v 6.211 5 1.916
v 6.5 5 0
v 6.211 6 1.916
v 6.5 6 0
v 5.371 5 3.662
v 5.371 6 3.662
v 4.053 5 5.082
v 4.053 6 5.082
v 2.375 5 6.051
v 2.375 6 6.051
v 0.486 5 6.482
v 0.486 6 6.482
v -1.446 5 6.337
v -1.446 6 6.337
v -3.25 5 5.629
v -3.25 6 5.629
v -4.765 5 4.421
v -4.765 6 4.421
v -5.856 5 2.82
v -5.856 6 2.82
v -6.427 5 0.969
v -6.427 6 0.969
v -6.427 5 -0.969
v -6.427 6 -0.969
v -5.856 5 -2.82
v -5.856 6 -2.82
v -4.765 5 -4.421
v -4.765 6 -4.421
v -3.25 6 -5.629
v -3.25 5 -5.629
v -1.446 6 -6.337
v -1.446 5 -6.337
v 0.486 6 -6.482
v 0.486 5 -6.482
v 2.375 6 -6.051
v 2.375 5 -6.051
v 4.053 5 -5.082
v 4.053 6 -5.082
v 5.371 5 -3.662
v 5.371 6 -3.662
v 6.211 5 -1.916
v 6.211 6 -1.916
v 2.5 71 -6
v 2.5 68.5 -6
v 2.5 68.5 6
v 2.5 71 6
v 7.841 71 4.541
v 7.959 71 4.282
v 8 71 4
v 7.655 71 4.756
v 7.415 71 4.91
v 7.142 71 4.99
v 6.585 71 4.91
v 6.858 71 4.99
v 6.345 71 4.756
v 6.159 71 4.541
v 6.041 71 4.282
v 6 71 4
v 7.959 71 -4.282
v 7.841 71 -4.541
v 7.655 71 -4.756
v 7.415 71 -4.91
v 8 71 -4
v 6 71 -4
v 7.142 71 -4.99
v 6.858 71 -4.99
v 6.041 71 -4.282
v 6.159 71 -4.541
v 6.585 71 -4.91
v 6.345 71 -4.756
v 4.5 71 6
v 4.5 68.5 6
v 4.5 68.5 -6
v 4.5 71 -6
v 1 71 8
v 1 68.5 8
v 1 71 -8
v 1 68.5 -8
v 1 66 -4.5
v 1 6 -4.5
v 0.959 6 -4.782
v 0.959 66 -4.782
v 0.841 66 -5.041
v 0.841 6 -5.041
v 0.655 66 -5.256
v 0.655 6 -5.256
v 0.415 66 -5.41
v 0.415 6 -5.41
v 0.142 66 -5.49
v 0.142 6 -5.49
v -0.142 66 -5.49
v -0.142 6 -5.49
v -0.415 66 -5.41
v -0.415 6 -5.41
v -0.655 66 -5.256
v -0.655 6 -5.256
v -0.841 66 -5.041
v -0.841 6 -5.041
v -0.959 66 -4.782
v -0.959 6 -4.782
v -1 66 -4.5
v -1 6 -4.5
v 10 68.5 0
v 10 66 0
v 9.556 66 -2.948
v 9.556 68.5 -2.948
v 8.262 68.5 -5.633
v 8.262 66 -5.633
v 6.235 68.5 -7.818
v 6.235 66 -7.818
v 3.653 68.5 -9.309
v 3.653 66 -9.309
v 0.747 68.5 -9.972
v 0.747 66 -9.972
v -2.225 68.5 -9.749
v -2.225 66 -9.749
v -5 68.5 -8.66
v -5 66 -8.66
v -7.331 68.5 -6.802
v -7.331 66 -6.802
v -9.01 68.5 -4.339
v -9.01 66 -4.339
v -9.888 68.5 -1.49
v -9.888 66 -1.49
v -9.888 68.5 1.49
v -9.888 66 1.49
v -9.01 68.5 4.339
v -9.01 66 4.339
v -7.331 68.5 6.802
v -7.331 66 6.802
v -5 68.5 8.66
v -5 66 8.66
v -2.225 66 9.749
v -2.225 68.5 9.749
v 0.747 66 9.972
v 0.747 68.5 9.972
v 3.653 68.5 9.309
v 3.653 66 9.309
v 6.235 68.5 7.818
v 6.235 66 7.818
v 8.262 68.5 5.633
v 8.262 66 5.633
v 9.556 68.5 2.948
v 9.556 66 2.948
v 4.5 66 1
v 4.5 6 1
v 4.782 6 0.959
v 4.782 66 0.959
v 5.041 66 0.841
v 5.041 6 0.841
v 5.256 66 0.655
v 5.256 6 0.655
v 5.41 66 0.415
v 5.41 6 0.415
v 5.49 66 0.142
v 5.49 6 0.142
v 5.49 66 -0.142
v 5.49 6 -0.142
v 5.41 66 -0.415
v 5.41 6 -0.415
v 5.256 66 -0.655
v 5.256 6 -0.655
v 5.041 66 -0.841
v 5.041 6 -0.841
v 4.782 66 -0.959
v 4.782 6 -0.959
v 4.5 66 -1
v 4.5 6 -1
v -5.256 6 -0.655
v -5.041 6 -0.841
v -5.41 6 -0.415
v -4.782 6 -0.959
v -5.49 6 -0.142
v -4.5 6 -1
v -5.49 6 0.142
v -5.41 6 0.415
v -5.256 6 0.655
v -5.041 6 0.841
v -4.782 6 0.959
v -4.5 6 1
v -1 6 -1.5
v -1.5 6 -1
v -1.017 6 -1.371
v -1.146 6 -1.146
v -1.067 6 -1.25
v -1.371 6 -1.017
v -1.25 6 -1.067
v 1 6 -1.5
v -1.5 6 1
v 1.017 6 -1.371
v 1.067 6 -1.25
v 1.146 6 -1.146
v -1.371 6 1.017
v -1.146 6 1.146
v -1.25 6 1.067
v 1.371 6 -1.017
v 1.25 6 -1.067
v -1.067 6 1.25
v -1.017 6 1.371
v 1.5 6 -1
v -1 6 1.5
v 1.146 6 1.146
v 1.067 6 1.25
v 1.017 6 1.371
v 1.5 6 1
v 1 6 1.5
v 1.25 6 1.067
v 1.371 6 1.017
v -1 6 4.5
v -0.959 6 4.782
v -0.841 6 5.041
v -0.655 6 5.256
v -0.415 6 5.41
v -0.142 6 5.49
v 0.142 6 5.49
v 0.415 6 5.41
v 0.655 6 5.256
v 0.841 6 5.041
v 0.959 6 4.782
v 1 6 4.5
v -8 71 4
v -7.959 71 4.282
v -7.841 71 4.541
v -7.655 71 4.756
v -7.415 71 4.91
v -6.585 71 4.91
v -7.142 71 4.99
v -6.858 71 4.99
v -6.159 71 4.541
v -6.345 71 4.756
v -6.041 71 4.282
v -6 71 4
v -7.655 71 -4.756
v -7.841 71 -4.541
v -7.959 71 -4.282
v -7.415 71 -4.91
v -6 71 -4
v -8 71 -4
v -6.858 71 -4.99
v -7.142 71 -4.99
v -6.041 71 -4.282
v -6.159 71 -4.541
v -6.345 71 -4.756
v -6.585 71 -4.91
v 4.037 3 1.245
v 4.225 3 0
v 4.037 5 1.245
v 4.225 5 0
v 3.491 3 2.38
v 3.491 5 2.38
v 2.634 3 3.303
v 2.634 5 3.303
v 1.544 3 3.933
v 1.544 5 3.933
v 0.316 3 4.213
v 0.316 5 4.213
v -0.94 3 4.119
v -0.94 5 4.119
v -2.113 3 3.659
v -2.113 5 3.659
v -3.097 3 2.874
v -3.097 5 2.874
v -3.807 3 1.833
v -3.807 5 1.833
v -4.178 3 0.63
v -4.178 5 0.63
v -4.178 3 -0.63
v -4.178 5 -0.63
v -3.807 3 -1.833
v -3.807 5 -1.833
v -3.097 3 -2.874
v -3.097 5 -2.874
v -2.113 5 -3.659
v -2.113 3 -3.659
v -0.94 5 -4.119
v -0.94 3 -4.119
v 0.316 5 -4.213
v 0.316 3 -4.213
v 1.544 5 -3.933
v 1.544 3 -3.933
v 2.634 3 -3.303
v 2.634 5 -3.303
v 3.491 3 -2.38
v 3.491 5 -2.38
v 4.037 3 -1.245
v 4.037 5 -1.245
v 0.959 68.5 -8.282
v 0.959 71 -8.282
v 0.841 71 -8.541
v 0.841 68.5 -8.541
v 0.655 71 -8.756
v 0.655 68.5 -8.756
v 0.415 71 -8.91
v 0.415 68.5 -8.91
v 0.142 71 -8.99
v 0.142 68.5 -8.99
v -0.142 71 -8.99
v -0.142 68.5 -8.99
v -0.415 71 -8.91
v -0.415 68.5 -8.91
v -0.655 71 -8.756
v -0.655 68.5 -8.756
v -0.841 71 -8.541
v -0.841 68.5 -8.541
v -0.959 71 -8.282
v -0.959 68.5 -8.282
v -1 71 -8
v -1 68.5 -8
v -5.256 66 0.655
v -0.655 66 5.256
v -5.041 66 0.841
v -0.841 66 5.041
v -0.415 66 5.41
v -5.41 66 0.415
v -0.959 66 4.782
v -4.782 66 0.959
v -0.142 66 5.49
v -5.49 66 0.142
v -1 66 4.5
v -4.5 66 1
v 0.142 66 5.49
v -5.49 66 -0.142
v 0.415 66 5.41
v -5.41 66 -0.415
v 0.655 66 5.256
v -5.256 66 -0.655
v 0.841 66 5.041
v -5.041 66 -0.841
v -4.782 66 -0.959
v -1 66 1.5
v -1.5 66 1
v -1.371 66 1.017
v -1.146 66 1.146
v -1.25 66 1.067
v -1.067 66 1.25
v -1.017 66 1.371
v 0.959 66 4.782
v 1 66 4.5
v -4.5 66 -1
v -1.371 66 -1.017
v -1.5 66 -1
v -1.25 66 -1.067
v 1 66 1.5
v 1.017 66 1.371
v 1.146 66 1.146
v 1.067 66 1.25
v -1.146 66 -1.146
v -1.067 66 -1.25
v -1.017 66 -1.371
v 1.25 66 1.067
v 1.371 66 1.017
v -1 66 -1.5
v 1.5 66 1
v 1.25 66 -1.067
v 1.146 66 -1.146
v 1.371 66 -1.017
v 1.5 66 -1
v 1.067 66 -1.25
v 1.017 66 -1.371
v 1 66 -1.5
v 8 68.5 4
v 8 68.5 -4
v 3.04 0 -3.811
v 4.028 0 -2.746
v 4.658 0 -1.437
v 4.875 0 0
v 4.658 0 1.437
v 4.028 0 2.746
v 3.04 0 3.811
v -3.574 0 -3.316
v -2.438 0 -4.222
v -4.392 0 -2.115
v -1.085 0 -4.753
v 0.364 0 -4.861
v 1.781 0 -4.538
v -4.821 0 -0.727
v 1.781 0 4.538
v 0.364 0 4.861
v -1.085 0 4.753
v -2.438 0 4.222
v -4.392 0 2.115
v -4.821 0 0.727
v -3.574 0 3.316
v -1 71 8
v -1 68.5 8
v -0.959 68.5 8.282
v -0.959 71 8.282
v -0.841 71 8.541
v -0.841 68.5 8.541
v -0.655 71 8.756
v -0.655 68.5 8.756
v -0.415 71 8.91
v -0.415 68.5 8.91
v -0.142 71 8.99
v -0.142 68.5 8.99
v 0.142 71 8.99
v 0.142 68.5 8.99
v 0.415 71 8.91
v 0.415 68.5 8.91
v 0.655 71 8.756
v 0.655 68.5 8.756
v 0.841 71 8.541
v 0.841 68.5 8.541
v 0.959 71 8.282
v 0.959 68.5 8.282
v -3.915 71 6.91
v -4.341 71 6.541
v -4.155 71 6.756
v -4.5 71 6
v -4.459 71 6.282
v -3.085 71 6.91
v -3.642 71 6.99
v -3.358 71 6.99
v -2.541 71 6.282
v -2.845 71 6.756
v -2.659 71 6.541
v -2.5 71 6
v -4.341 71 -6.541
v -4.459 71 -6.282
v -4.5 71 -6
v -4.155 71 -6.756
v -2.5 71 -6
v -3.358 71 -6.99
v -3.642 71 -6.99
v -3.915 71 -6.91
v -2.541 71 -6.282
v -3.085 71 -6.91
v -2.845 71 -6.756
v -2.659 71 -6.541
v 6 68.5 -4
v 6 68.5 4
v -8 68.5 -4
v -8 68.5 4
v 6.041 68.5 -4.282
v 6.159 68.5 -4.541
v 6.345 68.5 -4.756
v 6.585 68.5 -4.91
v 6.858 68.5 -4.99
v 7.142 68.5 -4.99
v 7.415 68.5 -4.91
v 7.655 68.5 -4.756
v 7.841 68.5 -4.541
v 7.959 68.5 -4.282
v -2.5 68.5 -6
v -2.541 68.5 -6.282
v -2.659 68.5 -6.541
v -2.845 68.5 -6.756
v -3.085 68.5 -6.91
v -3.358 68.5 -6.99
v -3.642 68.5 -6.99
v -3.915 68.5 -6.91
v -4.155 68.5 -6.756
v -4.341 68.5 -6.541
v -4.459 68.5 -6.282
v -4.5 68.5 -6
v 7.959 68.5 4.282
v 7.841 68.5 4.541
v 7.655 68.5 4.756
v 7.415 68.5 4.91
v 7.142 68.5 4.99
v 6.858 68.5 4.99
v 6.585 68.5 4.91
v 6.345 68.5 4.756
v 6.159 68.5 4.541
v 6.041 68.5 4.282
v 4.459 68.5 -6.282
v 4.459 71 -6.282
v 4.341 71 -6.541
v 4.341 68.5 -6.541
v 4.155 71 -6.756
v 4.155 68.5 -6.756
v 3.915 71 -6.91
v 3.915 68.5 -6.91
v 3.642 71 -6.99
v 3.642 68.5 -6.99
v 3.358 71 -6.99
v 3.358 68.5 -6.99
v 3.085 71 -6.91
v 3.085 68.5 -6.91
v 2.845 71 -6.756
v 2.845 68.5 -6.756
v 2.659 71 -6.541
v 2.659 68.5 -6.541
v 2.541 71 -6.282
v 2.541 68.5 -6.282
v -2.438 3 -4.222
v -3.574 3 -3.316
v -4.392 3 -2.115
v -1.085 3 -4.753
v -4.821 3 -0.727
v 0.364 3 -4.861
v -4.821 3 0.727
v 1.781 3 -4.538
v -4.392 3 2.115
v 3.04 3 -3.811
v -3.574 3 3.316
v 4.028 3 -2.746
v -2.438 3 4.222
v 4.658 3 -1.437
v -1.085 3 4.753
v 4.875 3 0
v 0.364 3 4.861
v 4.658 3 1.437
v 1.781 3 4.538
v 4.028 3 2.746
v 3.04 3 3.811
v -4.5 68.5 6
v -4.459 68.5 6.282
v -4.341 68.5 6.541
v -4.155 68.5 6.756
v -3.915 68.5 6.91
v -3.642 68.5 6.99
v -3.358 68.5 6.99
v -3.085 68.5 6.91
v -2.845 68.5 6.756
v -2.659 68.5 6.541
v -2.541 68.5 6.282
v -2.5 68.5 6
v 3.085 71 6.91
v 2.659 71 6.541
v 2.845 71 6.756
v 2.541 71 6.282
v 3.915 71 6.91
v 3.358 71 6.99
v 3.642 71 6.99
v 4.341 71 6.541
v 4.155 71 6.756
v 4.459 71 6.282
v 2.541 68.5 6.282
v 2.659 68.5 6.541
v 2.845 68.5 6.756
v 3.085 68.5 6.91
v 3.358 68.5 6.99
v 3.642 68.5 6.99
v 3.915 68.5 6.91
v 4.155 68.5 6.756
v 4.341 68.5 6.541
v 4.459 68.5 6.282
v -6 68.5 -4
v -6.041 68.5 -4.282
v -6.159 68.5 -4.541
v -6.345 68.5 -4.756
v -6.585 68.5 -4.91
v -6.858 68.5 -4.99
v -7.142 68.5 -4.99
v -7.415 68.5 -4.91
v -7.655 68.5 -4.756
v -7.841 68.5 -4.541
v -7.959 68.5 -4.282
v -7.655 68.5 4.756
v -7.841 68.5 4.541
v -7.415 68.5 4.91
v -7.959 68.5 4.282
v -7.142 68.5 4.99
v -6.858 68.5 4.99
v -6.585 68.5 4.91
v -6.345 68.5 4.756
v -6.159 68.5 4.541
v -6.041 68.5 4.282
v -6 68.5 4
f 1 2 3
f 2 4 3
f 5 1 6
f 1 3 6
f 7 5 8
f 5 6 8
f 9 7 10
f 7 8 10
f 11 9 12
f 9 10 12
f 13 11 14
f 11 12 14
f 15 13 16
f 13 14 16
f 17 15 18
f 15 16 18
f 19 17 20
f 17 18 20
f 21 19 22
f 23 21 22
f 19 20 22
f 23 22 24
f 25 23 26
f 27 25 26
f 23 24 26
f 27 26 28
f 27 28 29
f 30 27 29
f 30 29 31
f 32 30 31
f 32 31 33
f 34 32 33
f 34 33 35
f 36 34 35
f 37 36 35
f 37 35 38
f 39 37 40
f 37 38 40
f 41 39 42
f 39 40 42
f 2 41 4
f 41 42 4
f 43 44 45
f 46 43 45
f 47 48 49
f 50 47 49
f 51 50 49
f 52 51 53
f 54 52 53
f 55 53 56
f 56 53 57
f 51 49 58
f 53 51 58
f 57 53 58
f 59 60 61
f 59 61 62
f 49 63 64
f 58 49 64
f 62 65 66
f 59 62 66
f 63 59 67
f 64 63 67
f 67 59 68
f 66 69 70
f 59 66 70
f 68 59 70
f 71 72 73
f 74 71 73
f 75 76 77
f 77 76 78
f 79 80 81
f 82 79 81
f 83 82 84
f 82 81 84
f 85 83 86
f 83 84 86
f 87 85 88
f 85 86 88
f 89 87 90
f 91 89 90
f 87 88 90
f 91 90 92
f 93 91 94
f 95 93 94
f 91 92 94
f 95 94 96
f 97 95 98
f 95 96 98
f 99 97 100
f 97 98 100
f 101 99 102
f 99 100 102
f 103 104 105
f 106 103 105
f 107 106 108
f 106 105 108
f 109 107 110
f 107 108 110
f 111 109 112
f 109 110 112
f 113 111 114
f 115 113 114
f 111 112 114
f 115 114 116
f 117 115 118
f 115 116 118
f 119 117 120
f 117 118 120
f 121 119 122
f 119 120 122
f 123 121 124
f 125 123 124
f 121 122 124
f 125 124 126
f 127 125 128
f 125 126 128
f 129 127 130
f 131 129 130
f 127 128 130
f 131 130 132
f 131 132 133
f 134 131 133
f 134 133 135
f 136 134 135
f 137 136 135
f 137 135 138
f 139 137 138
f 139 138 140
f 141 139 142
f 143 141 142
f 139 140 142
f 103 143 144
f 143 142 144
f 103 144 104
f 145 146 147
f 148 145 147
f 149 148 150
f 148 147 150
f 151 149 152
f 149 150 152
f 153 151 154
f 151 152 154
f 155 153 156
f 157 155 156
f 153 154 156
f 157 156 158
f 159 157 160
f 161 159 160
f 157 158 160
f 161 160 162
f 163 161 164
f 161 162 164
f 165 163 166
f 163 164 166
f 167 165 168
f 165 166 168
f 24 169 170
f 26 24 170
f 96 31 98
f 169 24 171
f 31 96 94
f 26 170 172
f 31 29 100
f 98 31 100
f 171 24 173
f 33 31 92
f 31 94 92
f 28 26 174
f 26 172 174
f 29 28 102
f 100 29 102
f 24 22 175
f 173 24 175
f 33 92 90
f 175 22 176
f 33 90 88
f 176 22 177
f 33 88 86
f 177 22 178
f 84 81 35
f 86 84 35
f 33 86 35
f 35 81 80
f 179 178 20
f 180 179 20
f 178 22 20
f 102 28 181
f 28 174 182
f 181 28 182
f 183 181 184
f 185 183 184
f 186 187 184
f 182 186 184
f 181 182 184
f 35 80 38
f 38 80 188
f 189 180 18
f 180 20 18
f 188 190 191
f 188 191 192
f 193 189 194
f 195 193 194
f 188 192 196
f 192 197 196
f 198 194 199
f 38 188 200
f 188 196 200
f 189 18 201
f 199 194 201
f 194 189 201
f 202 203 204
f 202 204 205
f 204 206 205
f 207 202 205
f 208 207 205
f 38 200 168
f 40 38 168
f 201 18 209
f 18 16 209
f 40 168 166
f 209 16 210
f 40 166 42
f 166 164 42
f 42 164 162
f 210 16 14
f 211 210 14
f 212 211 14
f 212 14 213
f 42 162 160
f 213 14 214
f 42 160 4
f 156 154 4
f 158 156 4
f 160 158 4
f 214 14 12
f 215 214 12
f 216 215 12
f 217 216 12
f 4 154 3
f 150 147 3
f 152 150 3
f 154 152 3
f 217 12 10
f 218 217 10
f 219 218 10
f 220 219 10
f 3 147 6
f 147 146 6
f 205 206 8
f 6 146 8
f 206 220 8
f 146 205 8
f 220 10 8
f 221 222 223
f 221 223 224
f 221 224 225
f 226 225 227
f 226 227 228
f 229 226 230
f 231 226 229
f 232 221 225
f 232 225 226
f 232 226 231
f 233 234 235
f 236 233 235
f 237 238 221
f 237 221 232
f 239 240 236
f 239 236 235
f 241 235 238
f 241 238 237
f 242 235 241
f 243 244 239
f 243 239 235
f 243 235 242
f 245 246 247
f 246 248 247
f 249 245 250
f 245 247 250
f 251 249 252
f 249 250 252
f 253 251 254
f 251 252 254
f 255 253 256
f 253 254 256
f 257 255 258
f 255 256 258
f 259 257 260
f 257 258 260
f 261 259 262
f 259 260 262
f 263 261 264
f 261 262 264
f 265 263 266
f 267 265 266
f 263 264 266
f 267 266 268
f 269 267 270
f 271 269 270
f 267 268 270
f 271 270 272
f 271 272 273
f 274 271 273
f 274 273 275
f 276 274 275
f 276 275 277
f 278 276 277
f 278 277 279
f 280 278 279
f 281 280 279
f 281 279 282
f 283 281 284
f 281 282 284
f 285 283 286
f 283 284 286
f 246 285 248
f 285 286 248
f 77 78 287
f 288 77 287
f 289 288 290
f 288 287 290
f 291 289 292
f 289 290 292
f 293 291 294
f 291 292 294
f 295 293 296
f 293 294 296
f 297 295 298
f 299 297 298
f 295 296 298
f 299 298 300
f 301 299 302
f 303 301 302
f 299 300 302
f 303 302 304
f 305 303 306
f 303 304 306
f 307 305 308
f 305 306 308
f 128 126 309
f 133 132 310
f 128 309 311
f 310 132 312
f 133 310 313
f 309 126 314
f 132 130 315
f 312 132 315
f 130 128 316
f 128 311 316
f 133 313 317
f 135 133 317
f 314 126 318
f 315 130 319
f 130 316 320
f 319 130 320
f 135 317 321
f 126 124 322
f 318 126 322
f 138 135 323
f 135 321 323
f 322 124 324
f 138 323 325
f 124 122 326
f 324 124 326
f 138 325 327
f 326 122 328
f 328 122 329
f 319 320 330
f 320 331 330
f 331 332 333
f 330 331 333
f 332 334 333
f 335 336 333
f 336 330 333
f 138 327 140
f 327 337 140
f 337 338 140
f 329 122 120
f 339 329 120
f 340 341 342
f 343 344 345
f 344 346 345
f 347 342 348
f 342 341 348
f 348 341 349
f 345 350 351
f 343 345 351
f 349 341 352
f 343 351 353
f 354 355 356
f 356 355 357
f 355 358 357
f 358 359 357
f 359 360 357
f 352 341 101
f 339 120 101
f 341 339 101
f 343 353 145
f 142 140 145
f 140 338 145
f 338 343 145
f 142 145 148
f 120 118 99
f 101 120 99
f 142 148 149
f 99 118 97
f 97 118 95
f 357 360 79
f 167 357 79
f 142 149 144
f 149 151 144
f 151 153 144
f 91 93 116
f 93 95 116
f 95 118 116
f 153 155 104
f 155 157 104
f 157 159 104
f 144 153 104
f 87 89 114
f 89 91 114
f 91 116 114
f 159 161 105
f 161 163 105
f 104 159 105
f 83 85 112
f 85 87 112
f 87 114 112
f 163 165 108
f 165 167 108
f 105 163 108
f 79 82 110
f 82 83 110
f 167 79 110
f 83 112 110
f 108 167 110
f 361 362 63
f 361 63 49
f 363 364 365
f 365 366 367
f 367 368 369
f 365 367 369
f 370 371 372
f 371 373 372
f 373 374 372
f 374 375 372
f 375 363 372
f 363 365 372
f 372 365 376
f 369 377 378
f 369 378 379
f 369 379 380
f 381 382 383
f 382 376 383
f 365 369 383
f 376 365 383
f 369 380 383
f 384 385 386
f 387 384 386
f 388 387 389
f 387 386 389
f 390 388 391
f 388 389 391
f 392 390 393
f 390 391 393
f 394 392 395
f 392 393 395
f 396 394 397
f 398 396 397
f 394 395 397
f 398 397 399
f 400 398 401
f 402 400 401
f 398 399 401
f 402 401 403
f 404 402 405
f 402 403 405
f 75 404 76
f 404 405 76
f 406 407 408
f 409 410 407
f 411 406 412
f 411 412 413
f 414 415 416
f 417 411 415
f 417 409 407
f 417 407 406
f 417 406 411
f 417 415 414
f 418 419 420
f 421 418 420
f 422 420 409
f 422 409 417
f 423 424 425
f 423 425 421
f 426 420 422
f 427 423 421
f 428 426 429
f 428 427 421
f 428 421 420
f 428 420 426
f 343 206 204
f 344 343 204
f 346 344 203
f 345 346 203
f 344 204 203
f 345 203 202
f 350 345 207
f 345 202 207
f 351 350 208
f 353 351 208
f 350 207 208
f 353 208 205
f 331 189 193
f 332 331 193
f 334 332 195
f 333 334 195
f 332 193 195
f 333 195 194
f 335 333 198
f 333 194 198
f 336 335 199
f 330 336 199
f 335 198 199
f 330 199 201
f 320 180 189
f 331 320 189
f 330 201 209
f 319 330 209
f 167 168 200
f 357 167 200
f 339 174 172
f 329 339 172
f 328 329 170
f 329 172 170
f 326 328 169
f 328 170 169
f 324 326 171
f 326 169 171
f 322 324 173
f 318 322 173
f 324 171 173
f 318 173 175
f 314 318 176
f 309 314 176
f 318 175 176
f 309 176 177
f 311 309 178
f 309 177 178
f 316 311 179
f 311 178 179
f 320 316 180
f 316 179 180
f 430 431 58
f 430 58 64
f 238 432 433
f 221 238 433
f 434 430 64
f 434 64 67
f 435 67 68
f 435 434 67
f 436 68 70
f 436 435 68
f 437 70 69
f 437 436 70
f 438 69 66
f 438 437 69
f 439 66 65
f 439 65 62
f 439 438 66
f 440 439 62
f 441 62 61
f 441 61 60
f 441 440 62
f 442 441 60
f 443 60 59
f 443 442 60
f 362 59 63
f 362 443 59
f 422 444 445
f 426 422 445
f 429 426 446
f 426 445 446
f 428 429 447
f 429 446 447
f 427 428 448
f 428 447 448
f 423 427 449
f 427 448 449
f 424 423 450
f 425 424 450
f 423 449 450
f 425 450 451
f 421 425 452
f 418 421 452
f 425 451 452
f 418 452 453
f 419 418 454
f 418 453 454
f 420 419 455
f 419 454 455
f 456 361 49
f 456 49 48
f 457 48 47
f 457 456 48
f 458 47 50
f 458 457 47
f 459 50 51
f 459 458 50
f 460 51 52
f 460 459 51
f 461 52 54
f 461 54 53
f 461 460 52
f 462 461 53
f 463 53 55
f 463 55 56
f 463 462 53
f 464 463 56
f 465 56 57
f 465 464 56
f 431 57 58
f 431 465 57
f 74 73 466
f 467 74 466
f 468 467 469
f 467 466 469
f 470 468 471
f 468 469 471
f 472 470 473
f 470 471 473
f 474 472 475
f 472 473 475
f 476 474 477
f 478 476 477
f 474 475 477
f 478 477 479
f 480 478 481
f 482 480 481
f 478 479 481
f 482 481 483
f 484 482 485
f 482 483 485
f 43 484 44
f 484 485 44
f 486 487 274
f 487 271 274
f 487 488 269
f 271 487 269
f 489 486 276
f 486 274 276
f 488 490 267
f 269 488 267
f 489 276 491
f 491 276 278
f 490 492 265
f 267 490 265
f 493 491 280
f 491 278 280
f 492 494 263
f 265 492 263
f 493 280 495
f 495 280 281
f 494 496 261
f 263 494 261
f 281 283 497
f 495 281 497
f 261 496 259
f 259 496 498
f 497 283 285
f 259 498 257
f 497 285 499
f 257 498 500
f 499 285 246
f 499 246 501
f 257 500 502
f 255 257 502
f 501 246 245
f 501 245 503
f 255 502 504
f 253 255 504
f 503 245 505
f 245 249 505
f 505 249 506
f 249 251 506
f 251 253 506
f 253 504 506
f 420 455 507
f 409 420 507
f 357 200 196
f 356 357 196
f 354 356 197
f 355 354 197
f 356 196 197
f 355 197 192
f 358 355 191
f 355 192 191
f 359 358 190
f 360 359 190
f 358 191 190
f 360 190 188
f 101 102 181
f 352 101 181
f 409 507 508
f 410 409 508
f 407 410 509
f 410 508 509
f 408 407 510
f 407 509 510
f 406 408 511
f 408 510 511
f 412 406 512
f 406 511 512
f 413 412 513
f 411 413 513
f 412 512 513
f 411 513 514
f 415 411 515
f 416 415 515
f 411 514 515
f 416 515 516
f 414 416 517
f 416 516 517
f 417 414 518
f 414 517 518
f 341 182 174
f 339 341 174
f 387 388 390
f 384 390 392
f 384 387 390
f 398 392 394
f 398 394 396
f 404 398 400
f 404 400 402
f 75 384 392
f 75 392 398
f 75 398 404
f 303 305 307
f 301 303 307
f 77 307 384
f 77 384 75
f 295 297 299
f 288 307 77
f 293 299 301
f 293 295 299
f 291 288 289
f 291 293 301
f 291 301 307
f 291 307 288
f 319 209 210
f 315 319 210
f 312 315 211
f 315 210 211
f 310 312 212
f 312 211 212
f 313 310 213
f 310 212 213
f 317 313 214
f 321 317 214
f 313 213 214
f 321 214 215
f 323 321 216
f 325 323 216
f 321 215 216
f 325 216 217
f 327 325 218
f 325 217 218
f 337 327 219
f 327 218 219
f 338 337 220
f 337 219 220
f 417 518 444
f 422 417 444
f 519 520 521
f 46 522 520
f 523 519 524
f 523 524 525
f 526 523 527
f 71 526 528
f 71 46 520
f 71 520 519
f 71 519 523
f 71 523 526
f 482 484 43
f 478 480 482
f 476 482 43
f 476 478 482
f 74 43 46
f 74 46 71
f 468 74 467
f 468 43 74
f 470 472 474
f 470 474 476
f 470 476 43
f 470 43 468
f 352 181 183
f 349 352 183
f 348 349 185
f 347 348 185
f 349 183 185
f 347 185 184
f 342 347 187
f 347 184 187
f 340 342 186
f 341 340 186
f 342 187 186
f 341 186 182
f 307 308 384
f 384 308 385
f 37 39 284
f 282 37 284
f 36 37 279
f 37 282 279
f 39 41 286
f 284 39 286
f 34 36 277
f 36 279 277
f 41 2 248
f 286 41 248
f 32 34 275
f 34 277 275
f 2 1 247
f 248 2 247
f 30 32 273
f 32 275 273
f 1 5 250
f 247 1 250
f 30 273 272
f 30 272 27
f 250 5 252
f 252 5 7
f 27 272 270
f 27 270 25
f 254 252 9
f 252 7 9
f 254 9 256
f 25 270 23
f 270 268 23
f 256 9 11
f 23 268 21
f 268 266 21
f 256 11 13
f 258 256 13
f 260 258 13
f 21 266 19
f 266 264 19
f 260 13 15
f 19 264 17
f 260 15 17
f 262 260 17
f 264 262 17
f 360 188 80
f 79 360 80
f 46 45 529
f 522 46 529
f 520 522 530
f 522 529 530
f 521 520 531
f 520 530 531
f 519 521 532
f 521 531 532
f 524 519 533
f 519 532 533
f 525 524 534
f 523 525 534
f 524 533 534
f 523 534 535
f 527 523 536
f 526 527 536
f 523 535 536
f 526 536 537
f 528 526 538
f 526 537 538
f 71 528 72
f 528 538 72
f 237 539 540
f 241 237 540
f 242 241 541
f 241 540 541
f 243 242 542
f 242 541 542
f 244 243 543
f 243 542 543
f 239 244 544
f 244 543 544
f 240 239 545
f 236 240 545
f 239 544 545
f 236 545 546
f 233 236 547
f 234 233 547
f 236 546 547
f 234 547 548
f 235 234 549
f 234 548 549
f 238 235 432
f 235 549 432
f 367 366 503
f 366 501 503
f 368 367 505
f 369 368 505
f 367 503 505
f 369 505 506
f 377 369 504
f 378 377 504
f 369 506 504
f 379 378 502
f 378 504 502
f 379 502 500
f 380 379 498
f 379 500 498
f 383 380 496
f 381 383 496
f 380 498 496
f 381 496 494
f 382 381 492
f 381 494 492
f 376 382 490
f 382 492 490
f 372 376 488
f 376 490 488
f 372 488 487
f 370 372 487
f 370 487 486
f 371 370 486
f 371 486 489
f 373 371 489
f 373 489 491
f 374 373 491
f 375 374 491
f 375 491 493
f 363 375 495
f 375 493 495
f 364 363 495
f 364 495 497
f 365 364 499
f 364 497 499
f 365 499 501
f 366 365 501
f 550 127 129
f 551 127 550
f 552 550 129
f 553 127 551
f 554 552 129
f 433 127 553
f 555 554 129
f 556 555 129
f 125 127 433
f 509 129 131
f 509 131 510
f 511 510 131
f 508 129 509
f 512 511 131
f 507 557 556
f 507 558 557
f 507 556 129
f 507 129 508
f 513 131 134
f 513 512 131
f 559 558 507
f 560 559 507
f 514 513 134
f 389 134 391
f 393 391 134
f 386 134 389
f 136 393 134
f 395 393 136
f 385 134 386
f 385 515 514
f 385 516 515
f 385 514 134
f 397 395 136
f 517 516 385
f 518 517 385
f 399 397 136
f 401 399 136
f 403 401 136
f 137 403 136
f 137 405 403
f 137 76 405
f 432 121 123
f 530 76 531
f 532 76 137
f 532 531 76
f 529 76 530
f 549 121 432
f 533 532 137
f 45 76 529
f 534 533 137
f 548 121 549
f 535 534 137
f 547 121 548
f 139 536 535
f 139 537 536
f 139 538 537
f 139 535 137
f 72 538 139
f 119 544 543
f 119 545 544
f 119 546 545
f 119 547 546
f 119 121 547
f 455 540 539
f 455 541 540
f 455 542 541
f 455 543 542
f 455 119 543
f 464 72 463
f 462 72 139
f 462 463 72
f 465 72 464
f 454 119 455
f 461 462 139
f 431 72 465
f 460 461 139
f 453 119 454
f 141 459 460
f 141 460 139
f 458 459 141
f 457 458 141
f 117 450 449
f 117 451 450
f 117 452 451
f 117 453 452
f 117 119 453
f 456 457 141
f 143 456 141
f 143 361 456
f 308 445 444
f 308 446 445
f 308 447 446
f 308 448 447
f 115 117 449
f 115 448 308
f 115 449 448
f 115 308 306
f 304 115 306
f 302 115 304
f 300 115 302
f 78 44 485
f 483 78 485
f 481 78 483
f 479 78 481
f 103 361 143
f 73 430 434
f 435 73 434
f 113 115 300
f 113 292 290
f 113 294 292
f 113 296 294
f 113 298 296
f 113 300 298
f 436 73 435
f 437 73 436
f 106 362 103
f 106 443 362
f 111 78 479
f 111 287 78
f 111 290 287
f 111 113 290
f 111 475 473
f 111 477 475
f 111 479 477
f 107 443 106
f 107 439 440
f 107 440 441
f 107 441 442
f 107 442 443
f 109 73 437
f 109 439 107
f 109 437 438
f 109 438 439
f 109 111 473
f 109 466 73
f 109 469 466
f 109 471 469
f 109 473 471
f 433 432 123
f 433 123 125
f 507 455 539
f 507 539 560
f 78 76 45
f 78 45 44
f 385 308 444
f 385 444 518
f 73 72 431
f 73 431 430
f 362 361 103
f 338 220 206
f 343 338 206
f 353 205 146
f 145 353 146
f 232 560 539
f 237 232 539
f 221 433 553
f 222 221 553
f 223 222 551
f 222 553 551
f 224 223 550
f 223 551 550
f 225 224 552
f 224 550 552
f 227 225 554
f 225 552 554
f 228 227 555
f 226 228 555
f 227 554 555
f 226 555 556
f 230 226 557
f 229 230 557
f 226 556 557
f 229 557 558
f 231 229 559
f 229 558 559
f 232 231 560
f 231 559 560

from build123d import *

# Parameters (mm, degrees)
BOSS_EXTRUDE1_DEPTH = 60
SKETCH3_R           = 10
BOSS_EXTRUDE2_DEPTH = 2.5
BOSS_EXTRUDE3_DEPTH = 2.5


with BuildPart() as part:
    # Sketch1 → Revolve1 (revolve)
    with BuildSketch(Plane.XY):
        Polygon((0, 0), (4.875, 0), (4.875, 3), (4.225, 3), (4.225, 5), (6.5, 5), (6.5, 6), (0, 6), align=None)
    revolve(axis=Axis((0, 6, 0), (0, -1, 0)))

    # Sketch2 → Boss-Extrude1 (add)
    with BuildSketch(Plane(origin=(0, 6, 0), x_dir=(1, 0, 0), z_dir=(0, 1, 0))):
        with BuildLine():
            Line((-1, 4.5), (-1, 1.5))
            ThreePointArc((-1, 1.5), (-1.146446609, 1.146446609), (-1.5, 1))
            Line((-1.5, 1), (-4.5, 1))
            ThreePointArc((-4.5, 1), (-5.5, 0), (-4.5, -1))
            Line((-4.5, -1), (-1.5, -1))
            ThreePointArc((-1.5, -1), (-1.146446609, -1.146446609), (-1, -1.5))
            Line((-1, -1.5), (-1, -4.5))
            ThreePointArc((-1, -4.5), (0, -5.5), (1, -4.5))
            Line((1, -4.5), (1, -1.5))
            ThreePointArc((1, -1.5), (1.146446609, -1.146446609), (1.5, -1))
            Line((1.5, -1), (4.5, -1))
            ThreePointArc((4.5, -1), (5.5, 0), (4.5, 1))
            Line((4.5, 1), (1.5, 1))
            ThreePointArc((1.5, 1), (1.146446609, 1.146446609), (1, 1.5))
            Line((1, 1.5), (1, 4.5))
            ThreePointArc((1, 4.5), (0, 5.5), (-1, 4.5))
        make_face()
    extrude(amount=BOSS_EXTRUDE1_DEPTH)

    # Sketch3 → Boss-Extrude2 (add)
    with BuildSketch(Plane(origin=(0, 66, 0), x_dir=(1, 0, 0), z_dir=(0, 1, 0))):
        Circle(SKETCH3_R)
    extrude(amount=BOSS_EXTRUDE2_DEPTH)

    # Sketch4 → Boss-Extrude3 (add)
    with BuildSketch(Plane(origin=(0, 68.5, 0), x_dir=(1, 0, 0), z_dir=(0, 1, 0))):
        with BuildLine():
            ThreePointArc((1, 8), (0, 9), (-1, 8))
            Line((-1, 8), (-1, -8))
            ThreePointArc((-1, -8), (0, -9), (1, -8))
            Line((1, -8), (1, 8))
        make_face()
        with BuildLine():
            ThreePointArc((-2.5, 6), (-3.5, 7), (-4.5, 6))
            Line((-4.5, 6), (-4.5, -6))
            ThreePointArc((-4.5, -6), (-3.5, -7), (-2.5, -6))
            Line((-2.5, -6), (-2.5, 6))
        make_face()
        with BuildLine():
            ThreePointArc((4.5, 6), (3.5, 7), (2.5, 6))
            Line((2.5, 6), (2.5, -6))
            ThreePointArc((2.5, -6), (3.5, -7), (4.5, -6))
            Line((4.5, -6), (4.5, 6))
        make_face()
        with BuildLine():
            ThreePointArc((6, 4), (7, 5), (8, 4))
            Line((8, 4), (8, -4))
            ThreePointArc((8, -4), (7, -5), (6, -4))
            Line((6, -4), (6, 4))
        make_face()
        with BuildLine():
            Line((-6, -4), (-6, 4))
            ThreePointArc((-6, 4), (-7, 5), (-8, 4))
            Line((-8, 4), (-8, -4))
            ThreePointArc((-8, -4), (-7, -5), (-6, -4))
        make_face()
    extrude(amount=BOSS_EXTRUDE3_DEPTH)


solid = part.part
